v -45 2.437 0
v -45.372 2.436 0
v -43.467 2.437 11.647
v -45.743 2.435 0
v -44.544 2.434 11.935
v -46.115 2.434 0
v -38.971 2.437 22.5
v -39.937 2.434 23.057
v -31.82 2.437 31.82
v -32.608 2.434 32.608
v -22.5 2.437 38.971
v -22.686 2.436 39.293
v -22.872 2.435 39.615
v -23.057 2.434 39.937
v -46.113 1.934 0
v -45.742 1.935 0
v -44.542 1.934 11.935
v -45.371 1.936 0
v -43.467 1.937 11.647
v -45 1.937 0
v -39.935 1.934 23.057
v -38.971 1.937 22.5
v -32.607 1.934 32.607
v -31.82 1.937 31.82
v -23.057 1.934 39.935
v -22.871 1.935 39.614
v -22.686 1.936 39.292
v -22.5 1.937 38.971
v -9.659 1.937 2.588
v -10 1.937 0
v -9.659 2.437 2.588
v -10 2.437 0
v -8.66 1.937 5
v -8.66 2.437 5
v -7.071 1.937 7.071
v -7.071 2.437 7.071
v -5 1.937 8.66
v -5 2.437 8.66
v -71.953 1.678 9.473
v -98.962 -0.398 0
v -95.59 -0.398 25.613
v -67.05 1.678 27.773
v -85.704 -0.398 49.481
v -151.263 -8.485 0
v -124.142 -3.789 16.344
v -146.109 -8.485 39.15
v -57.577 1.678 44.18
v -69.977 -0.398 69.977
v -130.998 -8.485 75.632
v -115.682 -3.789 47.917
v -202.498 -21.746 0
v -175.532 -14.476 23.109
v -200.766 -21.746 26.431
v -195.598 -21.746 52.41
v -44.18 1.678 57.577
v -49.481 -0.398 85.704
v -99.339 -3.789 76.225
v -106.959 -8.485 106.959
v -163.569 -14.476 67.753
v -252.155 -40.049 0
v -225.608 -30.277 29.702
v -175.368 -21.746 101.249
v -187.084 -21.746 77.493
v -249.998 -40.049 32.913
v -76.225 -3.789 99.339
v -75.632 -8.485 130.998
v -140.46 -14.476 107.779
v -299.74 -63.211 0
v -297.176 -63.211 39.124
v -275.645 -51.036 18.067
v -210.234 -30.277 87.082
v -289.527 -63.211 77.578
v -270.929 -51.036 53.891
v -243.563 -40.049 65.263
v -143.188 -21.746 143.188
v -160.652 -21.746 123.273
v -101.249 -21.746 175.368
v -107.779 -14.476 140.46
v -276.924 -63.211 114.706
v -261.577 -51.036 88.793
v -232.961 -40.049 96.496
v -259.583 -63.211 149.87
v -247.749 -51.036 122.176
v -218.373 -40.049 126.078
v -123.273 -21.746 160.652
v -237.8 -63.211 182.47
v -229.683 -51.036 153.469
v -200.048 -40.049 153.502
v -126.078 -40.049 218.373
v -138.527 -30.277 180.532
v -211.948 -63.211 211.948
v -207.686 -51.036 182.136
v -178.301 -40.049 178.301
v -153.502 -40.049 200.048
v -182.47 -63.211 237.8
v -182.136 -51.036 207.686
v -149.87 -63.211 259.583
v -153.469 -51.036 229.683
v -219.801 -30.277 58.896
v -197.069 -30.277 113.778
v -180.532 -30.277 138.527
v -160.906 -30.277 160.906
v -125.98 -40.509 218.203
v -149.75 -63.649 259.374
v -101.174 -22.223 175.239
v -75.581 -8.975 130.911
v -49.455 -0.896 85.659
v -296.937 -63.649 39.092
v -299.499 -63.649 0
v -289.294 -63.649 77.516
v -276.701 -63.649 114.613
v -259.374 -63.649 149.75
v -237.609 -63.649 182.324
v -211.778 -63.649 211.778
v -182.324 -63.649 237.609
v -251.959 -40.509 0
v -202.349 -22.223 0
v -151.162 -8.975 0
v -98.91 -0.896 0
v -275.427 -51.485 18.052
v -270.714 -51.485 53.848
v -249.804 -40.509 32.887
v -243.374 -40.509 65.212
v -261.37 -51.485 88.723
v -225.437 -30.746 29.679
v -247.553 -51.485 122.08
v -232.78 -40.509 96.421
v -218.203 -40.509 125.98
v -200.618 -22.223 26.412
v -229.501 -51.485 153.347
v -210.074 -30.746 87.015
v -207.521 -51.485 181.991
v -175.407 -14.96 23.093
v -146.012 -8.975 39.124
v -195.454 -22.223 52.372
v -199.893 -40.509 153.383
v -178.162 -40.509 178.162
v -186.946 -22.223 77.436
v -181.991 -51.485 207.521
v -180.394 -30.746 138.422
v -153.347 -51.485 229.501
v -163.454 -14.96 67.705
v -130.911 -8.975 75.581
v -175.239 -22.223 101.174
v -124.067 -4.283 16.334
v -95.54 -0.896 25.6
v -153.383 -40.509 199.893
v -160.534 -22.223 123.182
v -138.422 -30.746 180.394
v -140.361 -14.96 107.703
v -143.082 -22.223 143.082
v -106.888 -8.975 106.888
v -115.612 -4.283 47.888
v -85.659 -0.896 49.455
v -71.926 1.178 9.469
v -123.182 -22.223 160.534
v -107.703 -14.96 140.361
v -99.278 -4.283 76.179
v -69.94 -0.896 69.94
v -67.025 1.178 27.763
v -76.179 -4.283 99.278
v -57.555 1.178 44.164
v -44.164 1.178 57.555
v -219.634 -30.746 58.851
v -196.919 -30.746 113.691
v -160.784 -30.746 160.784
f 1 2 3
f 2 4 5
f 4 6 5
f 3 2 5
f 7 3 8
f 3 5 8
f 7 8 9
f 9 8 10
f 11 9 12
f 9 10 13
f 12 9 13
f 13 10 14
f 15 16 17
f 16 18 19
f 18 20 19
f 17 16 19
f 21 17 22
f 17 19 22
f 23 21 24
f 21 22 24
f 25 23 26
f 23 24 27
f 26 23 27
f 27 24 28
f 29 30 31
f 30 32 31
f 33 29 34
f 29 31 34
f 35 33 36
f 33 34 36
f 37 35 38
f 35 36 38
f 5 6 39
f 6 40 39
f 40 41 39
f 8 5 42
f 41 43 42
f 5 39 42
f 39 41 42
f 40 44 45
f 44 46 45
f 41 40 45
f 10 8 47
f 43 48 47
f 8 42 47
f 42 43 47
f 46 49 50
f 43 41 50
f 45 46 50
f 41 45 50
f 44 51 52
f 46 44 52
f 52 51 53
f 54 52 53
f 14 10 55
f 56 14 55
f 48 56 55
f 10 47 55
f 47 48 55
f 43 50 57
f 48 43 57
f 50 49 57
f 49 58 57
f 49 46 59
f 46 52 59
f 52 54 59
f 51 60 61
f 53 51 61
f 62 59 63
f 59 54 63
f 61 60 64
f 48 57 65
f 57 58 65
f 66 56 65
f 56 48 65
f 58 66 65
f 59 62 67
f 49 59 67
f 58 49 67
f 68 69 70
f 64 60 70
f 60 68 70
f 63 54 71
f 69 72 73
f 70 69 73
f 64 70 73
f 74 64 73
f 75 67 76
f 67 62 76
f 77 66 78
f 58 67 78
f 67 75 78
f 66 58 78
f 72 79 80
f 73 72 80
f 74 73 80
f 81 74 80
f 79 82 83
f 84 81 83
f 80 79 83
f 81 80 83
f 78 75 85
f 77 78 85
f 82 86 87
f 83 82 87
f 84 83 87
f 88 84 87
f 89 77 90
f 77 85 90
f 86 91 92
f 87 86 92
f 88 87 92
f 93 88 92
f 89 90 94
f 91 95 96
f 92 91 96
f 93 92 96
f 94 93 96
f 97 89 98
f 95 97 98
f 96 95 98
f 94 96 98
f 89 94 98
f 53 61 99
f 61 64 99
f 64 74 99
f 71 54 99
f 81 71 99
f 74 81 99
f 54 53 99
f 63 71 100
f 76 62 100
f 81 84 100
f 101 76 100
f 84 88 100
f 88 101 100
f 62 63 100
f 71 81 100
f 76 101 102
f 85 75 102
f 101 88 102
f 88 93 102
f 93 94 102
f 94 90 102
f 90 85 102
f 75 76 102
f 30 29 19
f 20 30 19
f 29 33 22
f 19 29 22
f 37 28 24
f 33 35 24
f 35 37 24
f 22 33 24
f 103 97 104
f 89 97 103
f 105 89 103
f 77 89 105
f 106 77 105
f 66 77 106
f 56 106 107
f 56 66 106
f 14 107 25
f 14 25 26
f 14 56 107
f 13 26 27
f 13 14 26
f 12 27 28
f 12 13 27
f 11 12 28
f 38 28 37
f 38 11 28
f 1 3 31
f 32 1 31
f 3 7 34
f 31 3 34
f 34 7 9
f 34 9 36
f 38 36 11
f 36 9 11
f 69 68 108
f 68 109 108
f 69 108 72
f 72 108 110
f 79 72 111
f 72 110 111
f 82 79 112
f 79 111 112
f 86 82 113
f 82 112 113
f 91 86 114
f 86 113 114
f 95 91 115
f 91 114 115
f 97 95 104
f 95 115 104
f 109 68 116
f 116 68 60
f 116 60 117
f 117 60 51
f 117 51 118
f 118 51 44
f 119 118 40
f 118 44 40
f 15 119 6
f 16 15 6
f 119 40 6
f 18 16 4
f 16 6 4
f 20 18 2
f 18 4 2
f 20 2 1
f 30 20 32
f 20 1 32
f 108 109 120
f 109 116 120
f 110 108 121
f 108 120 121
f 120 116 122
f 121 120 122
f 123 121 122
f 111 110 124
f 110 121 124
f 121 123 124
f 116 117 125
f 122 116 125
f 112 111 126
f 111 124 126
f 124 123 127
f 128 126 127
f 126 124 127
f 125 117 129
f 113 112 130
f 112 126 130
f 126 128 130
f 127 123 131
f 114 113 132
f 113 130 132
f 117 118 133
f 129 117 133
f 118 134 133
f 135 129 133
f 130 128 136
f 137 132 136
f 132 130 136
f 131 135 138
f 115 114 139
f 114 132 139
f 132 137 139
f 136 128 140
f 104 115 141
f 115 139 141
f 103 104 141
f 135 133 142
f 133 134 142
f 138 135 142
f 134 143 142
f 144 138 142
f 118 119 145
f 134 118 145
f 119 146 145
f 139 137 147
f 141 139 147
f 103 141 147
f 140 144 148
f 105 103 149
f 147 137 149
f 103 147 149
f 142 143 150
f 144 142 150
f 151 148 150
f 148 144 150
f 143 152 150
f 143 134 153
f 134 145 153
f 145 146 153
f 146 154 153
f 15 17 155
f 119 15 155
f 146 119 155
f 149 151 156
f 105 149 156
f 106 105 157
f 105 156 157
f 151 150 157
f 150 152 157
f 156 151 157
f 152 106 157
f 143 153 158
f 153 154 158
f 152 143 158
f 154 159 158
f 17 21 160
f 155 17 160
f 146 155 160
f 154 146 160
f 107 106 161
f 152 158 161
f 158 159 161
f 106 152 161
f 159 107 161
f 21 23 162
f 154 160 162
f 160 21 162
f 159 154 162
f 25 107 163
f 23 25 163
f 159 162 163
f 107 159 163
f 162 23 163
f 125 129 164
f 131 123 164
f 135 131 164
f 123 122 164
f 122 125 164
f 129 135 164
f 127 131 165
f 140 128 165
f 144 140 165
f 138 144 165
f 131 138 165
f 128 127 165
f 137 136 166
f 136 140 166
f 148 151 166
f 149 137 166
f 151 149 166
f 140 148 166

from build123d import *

# Parameters (mm, degrees)
REVOLVE1_ANGLE = 60


with BuildPart() as part:
    # Sketch1 → Revolve1 (revolve)
    with BuildSketch(Plane.XY):
        with BuildLine():
            Line((-45, 1.936673673), (-10, 1.936673673))
            Line((-10, 1.936673673), (-10, 2.436673673))
            Line((-10, 2.436673673), (-45.000375853, 2.436673673))
            ThreePointArc((-45.000375853, 2.436673673), (-45.557674224, 2.435543108), (-46.114971099, 2.433826721))
            ThreePointArc((-46.114971099, 2.433826721), (-177.046295247, -14.475660779), (-299.740246695, -63.211034879))
            Line((-299.740246695, -63.211034879), (-299.499248826, -63.64912166))
            ThreePointArc((-299.499248826, -63.64912166), (-176.921010606, -14.959710114), (-46.11316839, 1.933829971))
            ThreePointArc((-46.11316839, 1.933829971), (-45.556584942, 1.935544259), (-45, 1.936673673))
        make_face()
    revolve(axis=Axis((0, -998.5, 0), (0, 1, 0)), revolution_arc=REVOLVE1_ANGLE)


solid = part.part
